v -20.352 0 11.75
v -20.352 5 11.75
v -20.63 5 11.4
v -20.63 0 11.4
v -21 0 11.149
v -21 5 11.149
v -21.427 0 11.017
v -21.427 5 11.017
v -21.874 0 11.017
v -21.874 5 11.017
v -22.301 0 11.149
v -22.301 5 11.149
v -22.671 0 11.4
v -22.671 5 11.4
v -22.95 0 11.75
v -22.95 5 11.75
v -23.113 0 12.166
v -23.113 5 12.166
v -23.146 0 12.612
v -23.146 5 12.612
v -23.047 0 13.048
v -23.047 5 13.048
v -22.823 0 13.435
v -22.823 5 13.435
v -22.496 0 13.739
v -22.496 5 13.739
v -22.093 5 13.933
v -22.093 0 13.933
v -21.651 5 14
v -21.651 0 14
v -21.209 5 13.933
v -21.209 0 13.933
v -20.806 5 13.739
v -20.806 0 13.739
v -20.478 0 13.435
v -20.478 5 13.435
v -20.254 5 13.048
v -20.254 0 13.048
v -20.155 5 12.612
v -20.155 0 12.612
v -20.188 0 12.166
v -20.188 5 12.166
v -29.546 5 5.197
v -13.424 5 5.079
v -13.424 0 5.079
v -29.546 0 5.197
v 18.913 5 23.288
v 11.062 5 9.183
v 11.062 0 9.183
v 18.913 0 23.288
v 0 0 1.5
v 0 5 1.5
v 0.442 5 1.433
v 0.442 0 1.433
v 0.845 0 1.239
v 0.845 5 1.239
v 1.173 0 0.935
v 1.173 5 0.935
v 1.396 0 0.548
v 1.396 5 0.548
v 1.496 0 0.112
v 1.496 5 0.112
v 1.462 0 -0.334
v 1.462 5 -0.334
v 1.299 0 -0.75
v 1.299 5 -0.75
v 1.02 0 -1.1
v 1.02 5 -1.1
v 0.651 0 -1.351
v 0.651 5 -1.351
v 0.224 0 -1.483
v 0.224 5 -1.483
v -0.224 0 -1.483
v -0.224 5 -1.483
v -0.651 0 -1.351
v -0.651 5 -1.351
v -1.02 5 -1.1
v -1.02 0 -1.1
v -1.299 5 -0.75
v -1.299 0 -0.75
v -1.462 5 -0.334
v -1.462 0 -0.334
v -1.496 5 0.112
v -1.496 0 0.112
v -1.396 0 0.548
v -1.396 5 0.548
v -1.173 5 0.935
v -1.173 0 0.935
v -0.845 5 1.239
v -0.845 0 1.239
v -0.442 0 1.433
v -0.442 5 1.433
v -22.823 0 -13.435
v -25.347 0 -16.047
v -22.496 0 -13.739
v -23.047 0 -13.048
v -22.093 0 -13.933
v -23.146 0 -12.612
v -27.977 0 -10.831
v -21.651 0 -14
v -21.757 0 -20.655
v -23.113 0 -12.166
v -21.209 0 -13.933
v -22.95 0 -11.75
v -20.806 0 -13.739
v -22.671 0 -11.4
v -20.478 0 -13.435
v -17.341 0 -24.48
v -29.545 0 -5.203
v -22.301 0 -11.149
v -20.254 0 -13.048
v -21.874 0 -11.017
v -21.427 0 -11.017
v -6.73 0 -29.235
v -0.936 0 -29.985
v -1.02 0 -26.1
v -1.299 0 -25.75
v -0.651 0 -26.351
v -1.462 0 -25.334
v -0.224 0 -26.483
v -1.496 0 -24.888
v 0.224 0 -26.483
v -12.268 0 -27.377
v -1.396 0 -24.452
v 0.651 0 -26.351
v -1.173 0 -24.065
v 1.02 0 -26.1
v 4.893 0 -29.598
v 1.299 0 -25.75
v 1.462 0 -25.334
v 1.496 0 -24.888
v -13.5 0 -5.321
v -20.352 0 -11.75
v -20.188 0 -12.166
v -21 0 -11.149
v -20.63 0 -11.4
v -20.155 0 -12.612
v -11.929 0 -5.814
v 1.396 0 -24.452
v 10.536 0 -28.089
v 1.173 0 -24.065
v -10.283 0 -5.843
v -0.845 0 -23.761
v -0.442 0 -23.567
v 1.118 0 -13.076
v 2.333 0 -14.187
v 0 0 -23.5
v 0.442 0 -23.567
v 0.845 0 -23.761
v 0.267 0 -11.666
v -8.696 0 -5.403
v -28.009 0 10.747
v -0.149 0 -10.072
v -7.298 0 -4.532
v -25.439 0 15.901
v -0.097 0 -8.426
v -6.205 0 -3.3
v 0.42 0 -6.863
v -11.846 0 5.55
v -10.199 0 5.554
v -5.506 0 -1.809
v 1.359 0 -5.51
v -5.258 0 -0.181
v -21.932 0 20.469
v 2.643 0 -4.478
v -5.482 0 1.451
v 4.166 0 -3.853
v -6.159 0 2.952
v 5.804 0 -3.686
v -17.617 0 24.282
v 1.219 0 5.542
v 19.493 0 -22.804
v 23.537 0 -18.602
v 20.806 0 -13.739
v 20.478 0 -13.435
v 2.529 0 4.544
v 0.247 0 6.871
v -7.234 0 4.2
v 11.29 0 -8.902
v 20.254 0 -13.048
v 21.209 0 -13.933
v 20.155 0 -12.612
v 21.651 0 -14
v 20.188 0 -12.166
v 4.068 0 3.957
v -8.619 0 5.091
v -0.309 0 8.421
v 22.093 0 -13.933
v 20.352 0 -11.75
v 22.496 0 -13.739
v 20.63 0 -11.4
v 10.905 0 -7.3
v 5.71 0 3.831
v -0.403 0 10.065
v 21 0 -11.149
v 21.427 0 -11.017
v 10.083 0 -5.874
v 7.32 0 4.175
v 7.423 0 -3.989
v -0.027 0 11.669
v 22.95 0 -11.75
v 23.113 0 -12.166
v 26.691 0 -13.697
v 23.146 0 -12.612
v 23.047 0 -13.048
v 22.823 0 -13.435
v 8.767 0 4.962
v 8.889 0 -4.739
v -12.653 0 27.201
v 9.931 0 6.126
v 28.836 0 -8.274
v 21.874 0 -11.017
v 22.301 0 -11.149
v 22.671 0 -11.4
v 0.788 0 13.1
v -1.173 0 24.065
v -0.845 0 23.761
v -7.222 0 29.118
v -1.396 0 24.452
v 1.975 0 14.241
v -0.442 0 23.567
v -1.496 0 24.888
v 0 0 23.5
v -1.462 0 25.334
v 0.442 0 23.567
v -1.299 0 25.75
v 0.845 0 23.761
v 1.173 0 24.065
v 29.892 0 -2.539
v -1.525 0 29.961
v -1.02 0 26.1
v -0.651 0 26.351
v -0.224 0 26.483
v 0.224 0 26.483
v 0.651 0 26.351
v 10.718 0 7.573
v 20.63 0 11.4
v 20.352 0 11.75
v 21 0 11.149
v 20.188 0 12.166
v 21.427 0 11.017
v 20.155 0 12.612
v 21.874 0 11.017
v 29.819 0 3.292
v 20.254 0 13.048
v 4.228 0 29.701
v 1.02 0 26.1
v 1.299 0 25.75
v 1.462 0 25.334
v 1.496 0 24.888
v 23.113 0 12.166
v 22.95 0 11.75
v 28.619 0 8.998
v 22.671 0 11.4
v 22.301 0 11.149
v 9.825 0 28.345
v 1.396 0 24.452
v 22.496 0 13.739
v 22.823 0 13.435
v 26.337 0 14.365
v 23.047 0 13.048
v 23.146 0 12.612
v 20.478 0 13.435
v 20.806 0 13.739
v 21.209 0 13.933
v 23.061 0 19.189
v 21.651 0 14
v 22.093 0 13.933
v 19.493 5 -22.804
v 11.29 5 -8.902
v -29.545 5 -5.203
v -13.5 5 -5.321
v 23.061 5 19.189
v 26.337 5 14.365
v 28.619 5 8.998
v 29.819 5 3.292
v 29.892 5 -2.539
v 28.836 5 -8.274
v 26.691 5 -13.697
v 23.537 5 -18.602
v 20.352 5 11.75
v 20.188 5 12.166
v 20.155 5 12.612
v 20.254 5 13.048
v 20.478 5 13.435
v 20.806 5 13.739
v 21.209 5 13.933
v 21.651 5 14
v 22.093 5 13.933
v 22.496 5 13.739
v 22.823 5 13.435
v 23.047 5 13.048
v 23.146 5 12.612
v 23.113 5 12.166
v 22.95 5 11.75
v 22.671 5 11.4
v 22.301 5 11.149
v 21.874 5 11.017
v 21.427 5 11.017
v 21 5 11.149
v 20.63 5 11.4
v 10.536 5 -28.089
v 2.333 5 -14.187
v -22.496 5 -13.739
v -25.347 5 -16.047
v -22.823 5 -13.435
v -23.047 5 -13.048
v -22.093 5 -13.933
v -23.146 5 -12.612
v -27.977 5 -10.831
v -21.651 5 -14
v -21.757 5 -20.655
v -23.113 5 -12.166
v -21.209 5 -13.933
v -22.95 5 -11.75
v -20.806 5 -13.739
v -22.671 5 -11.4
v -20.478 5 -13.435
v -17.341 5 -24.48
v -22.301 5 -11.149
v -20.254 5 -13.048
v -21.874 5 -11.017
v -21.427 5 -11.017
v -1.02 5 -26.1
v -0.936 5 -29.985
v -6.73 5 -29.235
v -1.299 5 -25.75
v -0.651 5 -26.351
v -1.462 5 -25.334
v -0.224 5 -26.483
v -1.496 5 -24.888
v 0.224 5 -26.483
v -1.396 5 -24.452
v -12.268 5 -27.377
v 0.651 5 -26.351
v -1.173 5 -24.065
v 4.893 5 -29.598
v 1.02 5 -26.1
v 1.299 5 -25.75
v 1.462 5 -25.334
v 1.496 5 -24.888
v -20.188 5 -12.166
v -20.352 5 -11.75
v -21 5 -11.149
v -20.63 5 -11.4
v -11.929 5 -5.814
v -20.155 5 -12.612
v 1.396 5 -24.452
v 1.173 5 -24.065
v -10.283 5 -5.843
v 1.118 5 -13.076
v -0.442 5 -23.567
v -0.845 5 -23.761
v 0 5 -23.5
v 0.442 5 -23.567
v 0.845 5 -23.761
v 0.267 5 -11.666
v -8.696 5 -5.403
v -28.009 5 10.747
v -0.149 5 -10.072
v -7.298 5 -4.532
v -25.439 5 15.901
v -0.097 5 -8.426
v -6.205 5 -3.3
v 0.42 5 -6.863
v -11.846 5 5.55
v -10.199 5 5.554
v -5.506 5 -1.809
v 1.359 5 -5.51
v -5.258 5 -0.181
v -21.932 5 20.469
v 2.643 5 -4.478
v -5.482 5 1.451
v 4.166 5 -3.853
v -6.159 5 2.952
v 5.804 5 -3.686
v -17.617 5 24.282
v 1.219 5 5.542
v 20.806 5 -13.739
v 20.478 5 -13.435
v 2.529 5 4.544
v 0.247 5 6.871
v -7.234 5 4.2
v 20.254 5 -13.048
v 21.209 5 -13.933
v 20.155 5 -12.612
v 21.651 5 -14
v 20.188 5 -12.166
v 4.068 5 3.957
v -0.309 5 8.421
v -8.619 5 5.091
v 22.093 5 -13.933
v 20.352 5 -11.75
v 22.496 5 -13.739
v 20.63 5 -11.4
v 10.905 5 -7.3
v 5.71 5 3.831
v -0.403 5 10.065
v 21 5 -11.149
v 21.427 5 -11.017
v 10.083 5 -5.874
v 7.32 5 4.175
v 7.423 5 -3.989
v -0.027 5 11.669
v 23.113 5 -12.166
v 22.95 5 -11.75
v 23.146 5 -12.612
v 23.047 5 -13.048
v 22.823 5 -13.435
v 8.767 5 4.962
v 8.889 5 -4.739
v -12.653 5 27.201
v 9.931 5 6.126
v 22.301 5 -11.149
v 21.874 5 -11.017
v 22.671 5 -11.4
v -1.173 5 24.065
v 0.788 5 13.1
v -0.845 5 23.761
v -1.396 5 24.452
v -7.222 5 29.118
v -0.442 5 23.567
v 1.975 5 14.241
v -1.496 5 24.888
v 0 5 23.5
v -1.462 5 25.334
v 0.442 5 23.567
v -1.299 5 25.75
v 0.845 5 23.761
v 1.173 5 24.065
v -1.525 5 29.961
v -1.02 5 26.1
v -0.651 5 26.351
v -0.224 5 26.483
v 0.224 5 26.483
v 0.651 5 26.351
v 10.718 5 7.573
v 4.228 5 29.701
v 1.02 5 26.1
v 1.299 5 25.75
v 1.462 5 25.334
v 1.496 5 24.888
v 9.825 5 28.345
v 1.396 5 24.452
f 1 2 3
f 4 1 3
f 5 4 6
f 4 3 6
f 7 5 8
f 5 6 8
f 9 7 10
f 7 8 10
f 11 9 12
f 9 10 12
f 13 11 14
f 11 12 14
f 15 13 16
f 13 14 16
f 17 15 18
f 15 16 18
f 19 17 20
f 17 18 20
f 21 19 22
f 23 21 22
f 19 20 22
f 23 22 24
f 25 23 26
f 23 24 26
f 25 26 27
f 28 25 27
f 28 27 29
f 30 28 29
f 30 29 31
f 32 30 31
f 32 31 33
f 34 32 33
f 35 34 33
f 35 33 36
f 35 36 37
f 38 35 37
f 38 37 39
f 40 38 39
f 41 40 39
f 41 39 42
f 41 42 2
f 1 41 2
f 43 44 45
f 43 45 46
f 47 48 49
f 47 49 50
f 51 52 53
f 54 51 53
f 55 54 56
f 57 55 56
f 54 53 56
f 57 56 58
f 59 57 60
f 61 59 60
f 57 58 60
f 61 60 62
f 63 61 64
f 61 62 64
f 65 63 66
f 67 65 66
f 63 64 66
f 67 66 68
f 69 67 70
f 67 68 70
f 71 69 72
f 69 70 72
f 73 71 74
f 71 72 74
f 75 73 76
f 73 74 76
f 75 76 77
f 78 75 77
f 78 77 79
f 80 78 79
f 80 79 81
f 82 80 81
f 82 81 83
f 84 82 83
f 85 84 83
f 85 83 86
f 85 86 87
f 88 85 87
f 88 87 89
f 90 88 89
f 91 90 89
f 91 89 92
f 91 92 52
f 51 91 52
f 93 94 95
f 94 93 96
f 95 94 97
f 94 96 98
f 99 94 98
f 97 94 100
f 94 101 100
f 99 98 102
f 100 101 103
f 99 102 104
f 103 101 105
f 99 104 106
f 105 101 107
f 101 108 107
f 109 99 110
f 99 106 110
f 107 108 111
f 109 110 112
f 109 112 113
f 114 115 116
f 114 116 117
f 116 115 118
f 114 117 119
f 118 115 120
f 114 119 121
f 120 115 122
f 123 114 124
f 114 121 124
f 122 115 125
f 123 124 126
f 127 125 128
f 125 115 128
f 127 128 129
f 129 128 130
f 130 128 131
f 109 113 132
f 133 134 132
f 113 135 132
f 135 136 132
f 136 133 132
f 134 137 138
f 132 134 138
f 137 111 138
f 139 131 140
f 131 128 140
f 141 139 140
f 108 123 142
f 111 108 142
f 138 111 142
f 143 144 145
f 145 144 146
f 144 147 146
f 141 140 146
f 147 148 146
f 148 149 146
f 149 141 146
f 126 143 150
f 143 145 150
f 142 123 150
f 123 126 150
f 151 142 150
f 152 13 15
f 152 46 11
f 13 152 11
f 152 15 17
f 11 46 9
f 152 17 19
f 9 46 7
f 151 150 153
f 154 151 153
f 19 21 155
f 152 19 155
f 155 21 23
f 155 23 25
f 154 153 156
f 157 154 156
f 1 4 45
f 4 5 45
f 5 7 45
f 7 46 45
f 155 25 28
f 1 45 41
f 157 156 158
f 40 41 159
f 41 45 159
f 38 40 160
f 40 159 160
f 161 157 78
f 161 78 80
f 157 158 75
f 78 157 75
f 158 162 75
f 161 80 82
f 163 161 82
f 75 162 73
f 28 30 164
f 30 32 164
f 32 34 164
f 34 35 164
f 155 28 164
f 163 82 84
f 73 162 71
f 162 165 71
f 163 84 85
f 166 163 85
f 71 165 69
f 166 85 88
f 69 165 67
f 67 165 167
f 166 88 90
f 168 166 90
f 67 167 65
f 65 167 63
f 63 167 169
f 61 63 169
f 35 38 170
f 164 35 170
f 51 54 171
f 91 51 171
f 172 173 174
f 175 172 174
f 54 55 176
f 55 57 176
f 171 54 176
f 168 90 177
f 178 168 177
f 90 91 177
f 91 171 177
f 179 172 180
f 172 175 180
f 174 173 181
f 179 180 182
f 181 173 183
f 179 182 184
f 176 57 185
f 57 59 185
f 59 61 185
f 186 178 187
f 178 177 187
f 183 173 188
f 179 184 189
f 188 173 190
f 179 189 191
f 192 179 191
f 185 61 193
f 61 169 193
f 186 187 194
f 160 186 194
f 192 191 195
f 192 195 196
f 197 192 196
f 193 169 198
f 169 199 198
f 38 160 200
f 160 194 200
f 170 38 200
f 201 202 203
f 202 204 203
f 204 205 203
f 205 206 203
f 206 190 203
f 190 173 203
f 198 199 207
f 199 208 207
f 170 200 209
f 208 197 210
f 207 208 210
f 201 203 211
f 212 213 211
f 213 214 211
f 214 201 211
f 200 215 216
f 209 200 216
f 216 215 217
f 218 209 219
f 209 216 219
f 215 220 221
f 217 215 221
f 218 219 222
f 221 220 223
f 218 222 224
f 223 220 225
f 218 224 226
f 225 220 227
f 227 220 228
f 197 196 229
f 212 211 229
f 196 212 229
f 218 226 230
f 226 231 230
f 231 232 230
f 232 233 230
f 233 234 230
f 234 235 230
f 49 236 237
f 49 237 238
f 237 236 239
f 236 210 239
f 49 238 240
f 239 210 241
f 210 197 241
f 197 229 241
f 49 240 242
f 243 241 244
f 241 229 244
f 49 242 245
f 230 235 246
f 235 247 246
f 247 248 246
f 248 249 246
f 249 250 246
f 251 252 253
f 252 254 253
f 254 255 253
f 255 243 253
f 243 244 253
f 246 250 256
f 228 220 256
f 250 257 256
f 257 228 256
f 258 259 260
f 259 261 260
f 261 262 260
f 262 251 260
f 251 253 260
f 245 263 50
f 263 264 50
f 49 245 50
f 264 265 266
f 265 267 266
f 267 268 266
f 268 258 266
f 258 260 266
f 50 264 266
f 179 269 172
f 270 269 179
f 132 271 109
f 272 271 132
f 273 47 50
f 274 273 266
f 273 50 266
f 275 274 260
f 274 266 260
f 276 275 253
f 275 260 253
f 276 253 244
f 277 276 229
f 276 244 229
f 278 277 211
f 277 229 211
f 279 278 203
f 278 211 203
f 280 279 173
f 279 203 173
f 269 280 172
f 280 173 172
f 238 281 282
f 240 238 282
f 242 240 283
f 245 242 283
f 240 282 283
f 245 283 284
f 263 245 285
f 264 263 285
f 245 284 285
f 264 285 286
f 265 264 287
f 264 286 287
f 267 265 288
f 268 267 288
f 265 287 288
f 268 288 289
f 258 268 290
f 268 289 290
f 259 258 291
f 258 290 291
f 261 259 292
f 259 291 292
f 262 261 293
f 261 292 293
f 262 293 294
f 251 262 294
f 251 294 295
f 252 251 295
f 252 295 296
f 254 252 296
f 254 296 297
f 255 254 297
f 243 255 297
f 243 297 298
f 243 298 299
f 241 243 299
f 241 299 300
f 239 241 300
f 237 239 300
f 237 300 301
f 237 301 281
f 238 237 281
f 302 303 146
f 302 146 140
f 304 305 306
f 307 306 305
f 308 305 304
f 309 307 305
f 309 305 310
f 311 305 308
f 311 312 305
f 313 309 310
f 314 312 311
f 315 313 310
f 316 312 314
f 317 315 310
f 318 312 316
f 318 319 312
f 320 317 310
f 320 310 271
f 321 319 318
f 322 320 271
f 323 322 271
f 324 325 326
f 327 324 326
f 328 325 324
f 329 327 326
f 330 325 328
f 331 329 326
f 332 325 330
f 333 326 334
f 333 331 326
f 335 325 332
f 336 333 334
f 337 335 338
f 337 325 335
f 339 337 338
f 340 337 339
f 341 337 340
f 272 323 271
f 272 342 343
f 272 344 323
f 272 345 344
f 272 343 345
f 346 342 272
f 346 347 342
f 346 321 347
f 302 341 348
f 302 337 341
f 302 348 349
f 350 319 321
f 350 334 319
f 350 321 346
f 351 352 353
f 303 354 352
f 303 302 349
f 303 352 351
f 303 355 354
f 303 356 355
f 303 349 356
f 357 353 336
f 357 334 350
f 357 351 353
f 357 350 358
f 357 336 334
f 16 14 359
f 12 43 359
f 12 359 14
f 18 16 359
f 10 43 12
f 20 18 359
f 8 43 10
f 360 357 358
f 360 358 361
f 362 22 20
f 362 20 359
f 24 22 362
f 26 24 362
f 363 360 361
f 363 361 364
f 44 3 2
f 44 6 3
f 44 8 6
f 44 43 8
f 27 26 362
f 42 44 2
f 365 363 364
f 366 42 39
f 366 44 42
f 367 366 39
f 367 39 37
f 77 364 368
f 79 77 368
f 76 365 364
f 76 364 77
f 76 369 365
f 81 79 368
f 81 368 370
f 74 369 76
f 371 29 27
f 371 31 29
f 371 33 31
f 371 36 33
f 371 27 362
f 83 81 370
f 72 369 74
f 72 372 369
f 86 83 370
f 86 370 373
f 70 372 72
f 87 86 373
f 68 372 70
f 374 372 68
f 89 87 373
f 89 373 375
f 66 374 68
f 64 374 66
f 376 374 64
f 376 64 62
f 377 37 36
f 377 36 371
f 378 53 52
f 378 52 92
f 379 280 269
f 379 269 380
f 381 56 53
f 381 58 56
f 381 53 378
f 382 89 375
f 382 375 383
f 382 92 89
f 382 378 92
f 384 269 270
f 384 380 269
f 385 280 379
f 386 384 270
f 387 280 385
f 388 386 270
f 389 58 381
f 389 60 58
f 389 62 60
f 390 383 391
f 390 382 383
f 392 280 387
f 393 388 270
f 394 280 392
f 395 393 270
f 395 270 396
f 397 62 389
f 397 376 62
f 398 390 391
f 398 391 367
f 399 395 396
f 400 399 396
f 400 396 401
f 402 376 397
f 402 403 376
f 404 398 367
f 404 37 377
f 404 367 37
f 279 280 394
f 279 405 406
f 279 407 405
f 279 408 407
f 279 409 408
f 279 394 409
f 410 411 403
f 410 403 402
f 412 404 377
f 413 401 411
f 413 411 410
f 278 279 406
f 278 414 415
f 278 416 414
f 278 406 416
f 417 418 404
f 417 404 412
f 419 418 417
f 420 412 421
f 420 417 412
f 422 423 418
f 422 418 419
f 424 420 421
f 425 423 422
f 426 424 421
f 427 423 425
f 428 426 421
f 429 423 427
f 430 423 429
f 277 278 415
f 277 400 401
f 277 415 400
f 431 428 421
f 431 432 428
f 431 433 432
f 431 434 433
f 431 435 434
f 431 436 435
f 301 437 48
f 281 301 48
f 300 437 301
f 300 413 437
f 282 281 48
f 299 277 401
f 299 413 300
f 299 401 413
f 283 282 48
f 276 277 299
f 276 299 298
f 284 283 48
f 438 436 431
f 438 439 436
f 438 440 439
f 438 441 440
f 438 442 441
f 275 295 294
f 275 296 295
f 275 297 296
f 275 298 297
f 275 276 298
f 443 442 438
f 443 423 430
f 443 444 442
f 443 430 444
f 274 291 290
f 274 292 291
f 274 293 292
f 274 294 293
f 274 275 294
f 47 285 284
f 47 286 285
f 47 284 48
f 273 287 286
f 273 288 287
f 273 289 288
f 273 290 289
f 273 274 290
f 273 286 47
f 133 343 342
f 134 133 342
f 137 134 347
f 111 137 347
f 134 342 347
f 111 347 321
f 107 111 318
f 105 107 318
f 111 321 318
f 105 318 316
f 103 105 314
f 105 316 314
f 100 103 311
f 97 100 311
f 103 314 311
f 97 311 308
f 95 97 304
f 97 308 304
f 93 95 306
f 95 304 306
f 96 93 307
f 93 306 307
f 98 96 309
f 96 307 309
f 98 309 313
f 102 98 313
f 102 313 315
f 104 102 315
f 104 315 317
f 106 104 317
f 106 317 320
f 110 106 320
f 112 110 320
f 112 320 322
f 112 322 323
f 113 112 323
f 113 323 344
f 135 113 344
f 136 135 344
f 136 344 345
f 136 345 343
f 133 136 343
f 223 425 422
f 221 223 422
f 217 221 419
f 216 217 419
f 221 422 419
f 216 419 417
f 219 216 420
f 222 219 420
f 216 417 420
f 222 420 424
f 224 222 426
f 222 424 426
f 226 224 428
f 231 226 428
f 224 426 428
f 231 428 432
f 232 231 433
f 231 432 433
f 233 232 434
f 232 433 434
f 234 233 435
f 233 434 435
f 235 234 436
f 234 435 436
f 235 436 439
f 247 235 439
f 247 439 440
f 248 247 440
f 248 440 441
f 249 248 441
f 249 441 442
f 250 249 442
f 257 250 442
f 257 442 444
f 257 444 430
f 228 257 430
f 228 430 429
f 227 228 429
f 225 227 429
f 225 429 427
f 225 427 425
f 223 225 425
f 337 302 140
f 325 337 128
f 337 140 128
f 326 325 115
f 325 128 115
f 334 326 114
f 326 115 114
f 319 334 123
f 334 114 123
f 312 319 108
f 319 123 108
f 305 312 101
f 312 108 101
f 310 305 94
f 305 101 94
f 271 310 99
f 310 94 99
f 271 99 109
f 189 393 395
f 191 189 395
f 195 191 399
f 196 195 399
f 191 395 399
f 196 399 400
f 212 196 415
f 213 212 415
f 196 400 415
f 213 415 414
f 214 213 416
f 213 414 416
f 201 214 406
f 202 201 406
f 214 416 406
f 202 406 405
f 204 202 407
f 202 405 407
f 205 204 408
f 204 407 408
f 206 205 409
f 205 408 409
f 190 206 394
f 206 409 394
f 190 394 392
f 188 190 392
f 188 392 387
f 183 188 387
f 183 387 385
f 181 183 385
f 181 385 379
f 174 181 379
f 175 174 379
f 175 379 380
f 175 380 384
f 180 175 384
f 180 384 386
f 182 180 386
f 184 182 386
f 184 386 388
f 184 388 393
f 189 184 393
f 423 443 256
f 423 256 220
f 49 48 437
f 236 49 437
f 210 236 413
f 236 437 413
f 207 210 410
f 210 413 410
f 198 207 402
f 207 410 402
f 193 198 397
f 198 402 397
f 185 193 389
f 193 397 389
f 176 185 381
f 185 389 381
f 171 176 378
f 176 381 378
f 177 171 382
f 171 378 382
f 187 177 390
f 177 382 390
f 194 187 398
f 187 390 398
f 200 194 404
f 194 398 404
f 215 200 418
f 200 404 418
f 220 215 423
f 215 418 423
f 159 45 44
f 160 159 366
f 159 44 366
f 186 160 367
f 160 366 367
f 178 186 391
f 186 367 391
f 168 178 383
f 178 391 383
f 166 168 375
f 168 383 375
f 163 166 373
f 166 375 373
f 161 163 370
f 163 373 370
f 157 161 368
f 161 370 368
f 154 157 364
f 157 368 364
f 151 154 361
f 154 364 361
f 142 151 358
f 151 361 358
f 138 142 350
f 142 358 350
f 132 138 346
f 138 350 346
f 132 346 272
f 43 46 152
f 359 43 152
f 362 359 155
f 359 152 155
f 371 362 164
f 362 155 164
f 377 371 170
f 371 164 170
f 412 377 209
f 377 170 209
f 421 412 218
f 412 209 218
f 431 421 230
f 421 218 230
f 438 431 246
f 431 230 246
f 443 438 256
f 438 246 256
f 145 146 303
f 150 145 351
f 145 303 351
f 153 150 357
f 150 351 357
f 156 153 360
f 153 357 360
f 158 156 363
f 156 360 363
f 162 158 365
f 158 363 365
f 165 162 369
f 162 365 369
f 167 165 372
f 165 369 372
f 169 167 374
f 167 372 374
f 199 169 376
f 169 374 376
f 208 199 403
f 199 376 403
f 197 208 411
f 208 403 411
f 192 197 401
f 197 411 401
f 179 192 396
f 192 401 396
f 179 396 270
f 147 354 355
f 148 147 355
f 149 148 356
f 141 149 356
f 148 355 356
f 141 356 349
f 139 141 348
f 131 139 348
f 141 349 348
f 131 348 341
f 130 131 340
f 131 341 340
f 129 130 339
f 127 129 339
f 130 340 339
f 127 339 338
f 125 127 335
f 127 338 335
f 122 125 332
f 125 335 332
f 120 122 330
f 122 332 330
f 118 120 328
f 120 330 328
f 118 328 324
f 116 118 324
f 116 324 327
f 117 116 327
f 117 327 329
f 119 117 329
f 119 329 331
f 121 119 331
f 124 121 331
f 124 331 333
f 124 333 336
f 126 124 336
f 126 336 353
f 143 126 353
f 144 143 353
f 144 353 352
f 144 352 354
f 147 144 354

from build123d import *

# Parameters (mm, degrees)
SKETCH5_R           = 30
BOSS_EXTRUDE1_DEPTH = 5
SKETCH6_R           = 5.75
CUT_EXTRUDE1_DEPTH  = 50
SKETCH11_R          = 1.5
CUT_EXTRUDE2_DEPTH  = 43.720018727
SKETCH13_R          = 1.5
CUT_EXTRUDE3_DEPTH  = 10
CIRPATTERN2_COUNT   = 6
CUT_EXTRUDE4_DEPTH  = 10


with BuildPart() as part:
    # Sketch5 → Boss-Extrude1 (new body)
    with BuildSketch(Plane(origin=(0, 0, 0), x_dir=(1, 0, 0), z_dir=(0, 1, 0))):
        with Locations(Location((0, 0, 0), (0, 0, 270))):
            Circle(SKETCH5_R)
    extrude(amount=BOSS_EXTRUDE1_DEPTH)

    # Sketch6 → Cut-Extrude1 (cut)
    with BuildSketch(Plane(origin=(0, 5, 0), x_dir=(1, 0, 0), z_dir=(0, 1, 0))):
        with Locations(Location((5.564652455, 9.430649132, 0), (0, 0, 270))):
            Circle(SKETCH6_R)
        with Locations(Location((5.325305202, -9.567843252, 0), (0, 0, 270))):
            Circle(SKETCH6_R)
        with Locations(Location((-11.00819821, 0.138683741, 0), (0, 0, 270))):
            Circle(SKETCH6_R)
    extrude(amount=-CUT_EXTRUDE1_DEPTH, mode=Mode.SUBTRACT)

    # Sketch11 → Cut-Extrude2 (cut, through all)
    with BuildSketch(Plane(origin=(0, 5, 0), x_dir=(1, 0, 0), z_dir=(0, 1, 0))):
        with Locations(Location((0, 0, 0), (0, 0, 270))):
            Circle(SKETCH11_R)
    extrude(amount=-CUT_EXTRUDE2_DEPTH, mode=Mode.SUBTRACT)

    # Sketch13 → Cut-Extrude3 (cut)
    with BuildSketch(Plane(origin=(0, 5, 0), x_dir=(1, 0, 0), z_dir=(0, 1, 0))):
        with Locations(Location((0, 25, 0), (0, 0, 270))):
            Circle(SKETCH13_R)
    cut_extrude3 = extrude(amount=-CUT_EXTRUDE3_DEPTH, mode=Mode.SUBTRACT)

    # CirPattern2: Cut-Extrude3 ×6 about axis
    cirpattern2_axis = Axis((0, 0, 0), (0, 1, 0))
    for i in range(1, CIRPATTERN2_COUNT):
        add(cut_extrude3.rotate(cirpattern2_axis, i * 360 / CIRPATTERN2_COUNT), mode=Mode.SUBTRACT)

    # Sketch14 → Cut-Extrude4 (cut)
    with BuildSketch(Plane(origin=(0, 5, 0), x_dir=(1, 0, 0), z_dir=(0, 1, 0))):
        with BuildLine():
            Line((9.868938528, -7.038931193), (19.133510592, -23.684357125))
            ThreePointArc((19.133510592, -23.684357125), (17.118789327, -30.75690251), (10.046243942, -28.742181244))
            Line((10.046243942, -28.742181244), (0.781671877, -12.096755312))
            ThreePointArc((0.781671877, -12.096755312), (2.796393143, -5.024209927), (9.868938528, -7.038931193))
        make_face()
        with BuildLine():
            Line((1.086170675, 12.073223814), (10.767141384, 28.479969565))
            ThreePointArc((10.767141384, 28.479969565), (17.888197845, 30.315876663), (19.724104943, 23.194820202))
            Line((19.724104943, 23.194820202), (10.043134234, 6.788074451))
            ThreePointArc((10.043134234, 6.788074451), (2.922077773, 4.952167353), (1.086170675, 12.073223814))
        make_face()
        with BuildLine():
            Line((-10.970227288, -5.061177624), (-29.962029078, -5.199861364))
            ThreePointArc((-29.962029078, -5.199861364), (-35.199861364, -0.037970922), (-30.037970922, 5.199861364))
            Line((-30.037970922, 5.199861364), (-11.046169132, 5.338545105))
            ThreePointArc((-11.046169132, 5.338545105), (-5.808336846, 0.176654663), (-10.970227288, -5.061177624))
        make_face()
    extrude(amount=-CUT_EXTRUDE4_DEPTH, mode=Mode.SUBTRACT)


solid = part.part
